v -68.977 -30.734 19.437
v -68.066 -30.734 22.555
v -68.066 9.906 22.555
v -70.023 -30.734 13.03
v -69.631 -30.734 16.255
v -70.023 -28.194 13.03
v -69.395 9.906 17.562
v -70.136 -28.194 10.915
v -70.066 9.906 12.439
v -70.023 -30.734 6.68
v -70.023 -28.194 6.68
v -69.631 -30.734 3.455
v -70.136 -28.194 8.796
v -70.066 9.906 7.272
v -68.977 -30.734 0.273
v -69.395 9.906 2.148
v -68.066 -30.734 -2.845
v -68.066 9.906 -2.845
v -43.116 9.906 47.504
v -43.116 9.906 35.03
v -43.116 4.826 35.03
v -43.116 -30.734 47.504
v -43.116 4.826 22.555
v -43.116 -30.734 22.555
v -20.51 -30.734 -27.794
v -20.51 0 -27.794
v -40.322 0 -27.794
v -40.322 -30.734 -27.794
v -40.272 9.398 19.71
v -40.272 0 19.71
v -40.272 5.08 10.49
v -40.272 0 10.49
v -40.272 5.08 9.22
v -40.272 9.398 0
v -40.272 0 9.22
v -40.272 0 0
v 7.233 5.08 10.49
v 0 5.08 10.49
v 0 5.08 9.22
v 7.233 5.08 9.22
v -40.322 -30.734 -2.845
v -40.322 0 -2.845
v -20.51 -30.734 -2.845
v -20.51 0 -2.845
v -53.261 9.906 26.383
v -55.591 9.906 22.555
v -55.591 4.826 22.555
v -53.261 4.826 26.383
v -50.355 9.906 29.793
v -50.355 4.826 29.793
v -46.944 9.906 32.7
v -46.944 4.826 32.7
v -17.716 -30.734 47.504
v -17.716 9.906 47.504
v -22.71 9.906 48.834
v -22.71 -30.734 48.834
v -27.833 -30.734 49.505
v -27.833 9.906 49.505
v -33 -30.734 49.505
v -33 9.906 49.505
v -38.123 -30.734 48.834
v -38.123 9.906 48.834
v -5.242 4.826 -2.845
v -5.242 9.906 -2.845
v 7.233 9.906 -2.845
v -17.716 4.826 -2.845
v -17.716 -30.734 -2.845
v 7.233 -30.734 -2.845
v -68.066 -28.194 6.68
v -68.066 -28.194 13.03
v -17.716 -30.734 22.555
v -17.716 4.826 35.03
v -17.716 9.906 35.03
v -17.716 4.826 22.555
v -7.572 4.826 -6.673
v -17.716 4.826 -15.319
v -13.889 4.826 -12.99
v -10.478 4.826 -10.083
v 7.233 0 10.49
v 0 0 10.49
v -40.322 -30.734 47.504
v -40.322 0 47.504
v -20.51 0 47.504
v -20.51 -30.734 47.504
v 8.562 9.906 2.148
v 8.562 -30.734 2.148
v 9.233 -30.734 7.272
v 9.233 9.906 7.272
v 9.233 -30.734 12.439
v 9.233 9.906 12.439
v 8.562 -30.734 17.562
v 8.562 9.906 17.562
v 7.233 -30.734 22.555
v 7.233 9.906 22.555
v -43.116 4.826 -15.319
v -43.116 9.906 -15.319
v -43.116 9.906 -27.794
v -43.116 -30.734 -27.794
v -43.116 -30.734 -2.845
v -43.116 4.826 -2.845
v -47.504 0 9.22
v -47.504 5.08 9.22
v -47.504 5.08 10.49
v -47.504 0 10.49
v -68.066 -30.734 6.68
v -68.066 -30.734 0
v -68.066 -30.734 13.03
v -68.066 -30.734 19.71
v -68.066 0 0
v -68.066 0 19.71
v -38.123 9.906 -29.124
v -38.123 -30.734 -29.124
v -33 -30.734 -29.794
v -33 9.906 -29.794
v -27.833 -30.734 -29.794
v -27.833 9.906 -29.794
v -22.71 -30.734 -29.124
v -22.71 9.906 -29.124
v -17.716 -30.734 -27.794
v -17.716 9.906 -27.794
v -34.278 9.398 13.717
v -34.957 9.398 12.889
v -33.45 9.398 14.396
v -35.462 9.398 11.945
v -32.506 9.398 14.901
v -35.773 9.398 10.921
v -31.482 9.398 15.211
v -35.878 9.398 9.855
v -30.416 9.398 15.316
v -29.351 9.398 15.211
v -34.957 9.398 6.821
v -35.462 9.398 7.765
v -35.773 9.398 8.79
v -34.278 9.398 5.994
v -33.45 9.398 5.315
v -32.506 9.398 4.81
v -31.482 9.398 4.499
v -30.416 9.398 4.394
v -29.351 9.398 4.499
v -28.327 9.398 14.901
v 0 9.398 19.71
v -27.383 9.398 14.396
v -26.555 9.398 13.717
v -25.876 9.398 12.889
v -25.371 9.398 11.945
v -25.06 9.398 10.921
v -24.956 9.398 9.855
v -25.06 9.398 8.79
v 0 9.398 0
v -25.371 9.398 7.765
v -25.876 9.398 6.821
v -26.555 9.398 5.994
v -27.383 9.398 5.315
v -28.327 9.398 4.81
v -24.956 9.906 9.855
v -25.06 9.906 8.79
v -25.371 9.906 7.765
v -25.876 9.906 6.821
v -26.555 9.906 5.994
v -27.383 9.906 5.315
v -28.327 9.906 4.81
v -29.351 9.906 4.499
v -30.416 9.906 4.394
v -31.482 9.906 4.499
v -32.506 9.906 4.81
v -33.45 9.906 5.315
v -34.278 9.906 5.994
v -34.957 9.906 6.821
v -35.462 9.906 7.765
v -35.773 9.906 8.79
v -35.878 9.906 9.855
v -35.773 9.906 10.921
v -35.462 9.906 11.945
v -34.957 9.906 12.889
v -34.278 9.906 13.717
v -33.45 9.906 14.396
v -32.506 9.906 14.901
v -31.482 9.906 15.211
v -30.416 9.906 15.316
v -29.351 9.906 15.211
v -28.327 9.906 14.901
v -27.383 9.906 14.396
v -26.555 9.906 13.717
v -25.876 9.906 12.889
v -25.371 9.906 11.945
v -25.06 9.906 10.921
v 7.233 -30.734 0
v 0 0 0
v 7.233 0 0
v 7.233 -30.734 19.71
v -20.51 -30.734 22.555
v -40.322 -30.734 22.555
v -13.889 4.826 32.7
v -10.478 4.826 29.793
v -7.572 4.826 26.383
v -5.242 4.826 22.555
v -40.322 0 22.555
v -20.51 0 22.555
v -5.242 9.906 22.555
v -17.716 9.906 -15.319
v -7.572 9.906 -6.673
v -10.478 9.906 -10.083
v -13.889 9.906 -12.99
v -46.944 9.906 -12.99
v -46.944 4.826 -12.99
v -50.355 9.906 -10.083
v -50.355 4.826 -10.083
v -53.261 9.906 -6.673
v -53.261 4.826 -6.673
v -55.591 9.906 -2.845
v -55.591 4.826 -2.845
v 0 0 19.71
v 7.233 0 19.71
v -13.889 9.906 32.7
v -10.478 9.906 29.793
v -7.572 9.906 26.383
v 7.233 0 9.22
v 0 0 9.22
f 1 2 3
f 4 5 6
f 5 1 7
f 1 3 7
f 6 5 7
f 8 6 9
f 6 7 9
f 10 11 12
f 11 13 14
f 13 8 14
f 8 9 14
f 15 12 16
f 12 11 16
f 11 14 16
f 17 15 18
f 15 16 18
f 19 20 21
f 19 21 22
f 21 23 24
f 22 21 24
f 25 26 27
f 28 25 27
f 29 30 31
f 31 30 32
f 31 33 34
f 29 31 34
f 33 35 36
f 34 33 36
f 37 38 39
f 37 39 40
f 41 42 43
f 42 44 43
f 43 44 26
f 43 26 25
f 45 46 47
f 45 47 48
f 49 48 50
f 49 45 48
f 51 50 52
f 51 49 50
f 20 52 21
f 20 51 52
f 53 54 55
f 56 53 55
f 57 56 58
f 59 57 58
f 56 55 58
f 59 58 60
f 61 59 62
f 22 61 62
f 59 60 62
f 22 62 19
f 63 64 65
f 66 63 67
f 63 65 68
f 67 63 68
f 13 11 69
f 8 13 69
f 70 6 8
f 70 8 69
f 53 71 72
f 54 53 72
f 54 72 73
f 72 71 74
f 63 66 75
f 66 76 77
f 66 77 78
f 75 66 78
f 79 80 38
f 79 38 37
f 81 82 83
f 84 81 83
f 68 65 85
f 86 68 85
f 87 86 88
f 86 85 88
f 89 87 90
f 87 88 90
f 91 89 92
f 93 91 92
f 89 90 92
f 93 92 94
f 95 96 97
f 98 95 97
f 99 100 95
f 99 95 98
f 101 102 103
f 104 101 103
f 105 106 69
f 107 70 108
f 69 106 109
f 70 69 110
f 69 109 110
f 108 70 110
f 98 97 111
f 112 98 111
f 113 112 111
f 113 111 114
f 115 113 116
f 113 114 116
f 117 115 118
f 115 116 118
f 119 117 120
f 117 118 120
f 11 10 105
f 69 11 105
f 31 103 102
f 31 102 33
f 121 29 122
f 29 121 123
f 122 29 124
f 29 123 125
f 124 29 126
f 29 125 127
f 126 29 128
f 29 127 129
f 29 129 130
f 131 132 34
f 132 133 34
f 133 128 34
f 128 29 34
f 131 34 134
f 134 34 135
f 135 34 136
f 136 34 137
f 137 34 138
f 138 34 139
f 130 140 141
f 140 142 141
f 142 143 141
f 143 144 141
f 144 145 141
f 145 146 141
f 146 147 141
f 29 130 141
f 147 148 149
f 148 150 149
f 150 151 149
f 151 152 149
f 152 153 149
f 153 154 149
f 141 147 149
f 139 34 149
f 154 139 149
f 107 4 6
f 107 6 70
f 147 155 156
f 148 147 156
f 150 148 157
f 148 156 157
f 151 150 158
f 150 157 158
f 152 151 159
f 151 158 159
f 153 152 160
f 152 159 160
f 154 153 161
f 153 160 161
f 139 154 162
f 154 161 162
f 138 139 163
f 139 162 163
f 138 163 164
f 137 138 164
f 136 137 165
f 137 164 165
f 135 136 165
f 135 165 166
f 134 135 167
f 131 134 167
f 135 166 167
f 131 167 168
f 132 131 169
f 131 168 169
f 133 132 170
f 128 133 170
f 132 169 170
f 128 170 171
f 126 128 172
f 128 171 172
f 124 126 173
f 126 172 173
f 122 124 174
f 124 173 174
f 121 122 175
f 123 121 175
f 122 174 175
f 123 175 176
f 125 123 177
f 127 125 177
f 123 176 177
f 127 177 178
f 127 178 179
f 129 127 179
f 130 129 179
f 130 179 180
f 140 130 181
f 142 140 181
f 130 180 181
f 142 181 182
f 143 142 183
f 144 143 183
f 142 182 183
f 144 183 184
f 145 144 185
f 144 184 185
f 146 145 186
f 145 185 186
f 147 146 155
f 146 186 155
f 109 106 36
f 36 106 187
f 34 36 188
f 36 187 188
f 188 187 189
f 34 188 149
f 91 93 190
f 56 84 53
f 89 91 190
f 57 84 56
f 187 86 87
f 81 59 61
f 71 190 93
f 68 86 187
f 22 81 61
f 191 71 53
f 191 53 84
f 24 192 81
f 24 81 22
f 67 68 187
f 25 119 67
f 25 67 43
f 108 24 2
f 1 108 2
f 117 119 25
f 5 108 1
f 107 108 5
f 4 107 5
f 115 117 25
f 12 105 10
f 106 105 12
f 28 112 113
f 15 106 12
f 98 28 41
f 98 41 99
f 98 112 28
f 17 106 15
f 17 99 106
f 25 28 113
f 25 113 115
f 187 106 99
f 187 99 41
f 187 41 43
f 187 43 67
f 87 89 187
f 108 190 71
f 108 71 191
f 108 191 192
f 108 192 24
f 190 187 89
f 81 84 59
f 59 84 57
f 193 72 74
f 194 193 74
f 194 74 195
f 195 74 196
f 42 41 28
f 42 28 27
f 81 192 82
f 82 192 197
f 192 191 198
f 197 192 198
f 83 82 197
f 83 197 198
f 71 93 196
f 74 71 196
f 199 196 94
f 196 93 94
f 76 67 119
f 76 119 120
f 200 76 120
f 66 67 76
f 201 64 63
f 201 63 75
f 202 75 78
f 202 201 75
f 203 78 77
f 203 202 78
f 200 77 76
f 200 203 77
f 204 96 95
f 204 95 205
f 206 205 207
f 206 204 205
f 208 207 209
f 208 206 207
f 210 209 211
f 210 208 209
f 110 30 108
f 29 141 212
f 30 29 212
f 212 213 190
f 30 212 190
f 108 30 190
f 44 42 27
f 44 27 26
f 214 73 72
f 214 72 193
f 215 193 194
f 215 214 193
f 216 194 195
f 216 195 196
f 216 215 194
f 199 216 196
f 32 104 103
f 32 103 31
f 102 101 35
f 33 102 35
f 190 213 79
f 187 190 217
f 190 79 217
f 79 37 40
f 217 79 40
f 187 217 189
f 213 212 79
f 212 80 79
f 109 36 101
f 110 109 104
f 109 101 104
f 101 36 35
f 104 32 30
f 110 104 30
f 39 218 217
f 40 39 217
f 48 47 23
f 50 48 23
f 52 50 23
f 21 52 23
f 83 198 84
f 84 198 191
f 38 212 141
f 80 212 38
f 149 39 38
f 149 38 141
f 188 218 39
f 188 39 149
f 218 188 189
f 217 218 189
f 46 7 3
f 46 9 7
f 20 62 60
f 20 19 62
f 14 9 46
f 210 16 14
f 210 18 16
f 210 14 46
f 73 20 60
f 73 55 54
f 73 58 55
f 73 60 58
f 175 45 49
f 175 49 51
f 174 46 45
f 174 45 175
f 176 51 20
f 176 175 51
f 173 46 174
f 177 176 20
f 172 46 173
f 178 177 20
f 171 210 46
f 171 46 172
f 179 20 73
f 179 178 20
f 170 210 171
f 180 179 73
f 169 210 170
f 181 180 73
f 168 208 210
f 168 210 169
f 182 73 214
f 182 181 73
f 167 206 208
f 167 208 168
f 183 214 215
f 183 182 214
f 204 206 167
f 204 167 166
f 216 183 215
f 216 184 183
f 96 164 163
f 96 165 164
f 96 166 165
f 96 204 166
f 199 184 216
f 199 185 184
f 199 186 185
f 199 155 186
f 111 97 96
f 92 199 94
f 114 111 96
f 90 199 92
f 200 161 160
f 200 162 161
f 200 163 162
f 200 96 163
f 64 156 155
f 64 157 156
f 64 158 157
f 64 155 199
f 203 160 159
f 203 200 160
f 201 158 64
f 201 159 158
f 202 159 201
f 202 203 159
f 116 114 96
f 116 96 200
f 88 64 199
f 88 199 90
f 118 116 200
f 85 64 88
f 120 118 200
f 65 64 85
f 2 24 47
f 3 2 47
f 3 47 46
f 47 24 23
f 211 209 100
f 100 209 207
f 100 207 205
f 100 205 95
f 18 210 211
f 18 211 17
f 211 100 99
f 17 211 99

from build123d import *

# Parameters (mm, degrees)
SKETCH1_W           = 54.737
SKETCH1_H           = 25.4
SKETCH1_W_2         = 40.2717
SKETCH1_H_2         = 19.7104
BOSS_EXTRUDE2_DEPTH = 9.906
SKETCH3_R           = 9.8552
SKETCH3_R_2         = 5.461
BOSS_EXTRUDE3_DEPTH = 0.508
SKETCH9_W           = 7.23265
SKETCH9_H           = 1.27
CUT_EXTRUDE2_DEPTH  = 5.08
SKETCH12_W          = 54.737
SKETCH12_H          = 2.8448
BOSS_EXTRUDE4_DEPTH = 30.734
BOSS_EXTRUDE5_DEPTH = 20.5613
BOSS_EXTRUDE6_DEPTH = 24.94915
BOSS_EXTRUDE7_DEPTH = 24.94915
BOSS_EXTRUDE8_DEPTH = 40.64
BOSS_EXTRUDE9_DEPTH = 5.08
SKETCH25_W          = 2.54
SKETCH25_H          = 6.35
CUT_EXTRUDE3_DEPTH  = 2.54


with BuildPart() as part:
    # Sketch1 → Boss-Extrude2 (new body)
    with BuildSketch(Plane(origin=(0, 0, 0), x_dir=(1, 0, 0), z_dir=(0, 1, 0))):
        with Locations((-20.13585, -9.8552)):
            Rectangle(SKETCH1_W, SKETCH1_H)
        with Locations((-20.13585, -9.8552)):
            Rectangle(SKETCH1_W_2, SKETCH1_H_2, mode=Mode.SUBTRACT)
    extrude(amount=BOSS_EXTRUDE2_DEPTH)

    # Sketch3 → Boss-Extrude3 (add)
    with BuildSketch(Plane(origin=(0, 9.906, 0), x_dir=(1, 0, 0), z_dir=(0, 1, 0))):
        with Locations((-30.4165, -9.8552)):
            Circle(SKETCH3_R)
        with Locations((-30.4165, -9.8552)):
            Circle(SKETCH3_R_2, mode=Mode.SUBTRACT)
        with BuildLine():
            ThreePointArc((-30.4165, -19.7104), (-37.38517875, -16.82387875), (-40.2717, -9.8552))
            Line((-40.2717, -9.8552), (-40.2717, -19.7104))
            Line((-40.2717, -19.7104), (-30.4165, -19.7104))
        make_face()
        with BuildLine():
            Line((0, 0), (-30.4165, 0))
            ThreePointArc((-30.4165, 0), (-23.44782125, -2.88652125), (-20.5613, -9.8552))
            ThreePointArc((-20.5613, -9.8552), (-23.44782125, -16.82387875), (-30.4165, -19.7104))
            Line((-30.4165, -19.7104), (0, -19.7104))
            Line((0, -19.7104), (0, 0))
        make_face()
        with BuildLine():
            Line((-30.4165, 0), (-40.2717, 0))
            Line((-40.2717, 0), (-40.2717, -9.8552))
            ThreePointArc((-40.2717, -9.8552), (-37.38517875, -2.88652125), (-30.4165, 0))
        make_face()
    extrude(amount=-BOSS_EXTRUDE3_DEPTH)

    # Sketch9 → Cut-Extrude2 (cut)
    with BuildSketch(Plane.XZ):
        with Locations((-43.888025, 9.8552)):
            Rectangle(SKETCH9_W, SKETCH9_H)
        with Locations((3.616325, 9.8552)):
            Rectangle(SKETCH9_W, SKETCH9_H)
    extrude(amount=-CUT_EXTRUDE2_DEPTH, mode=Mode.SUBTRACT)

    # Sketch12 → Boss-Extrude4 (add)
    with BuildSketch(Plane.XZ):
        with Locations((-20.13585, 21.1328)):
            Rectangle(SKETCH12_W, SKETCH12_H)
        with Locations((-20.13585, -1.4224)):
            Rectangle(SKETCH12_W, SKETCH12_H)
    extrude(amount=BOSS_EXTRUDE4_DEPTH)

    # Sketch19 → Boss-Extrude5 (add)
    with BuildSketch(Plane.ZY.offset(47.50435)):
        Polygon((-2.8448, -30.734), (0, -30.734), (0, 0), (19.7104, 0), (19.7104, -30.734), (22.5552, -30.734), (22.5552, 9.906), (-2.8448, 9.906), align=None)
    extrude(amount=BOSS_EXTRUDE5_DEPTH)

    # Sketch20 → Boss-Extrude6 (add)
    with BuildSketch(Plane(origin=(0, 0, -2.8448), x_dir=(-1, 0, 0), z_dir=(0, 0, -1))):
        Polygon((17.7165, 9.906), (43.1165, 9.906), (43.1165, -30.734), (40.3225, -30.734), (40.3225, 0), (20.5105, 0), (20.5105, -30.734), (17.7165, -30.734), align=None)
    extrude(amount=BOSS_EXTRUDE6_DEPTH)

    # Sketch21 → Boss-Extrude7 (add)
    with BuildSketch(Plane.XY.offset(22.5552)):
        Polygon((-43.1165, 9.906), (-43.1165, -30.734), (-40.3225, -30.734), (-40.3225, 0), (-20.5105, 0), (-20.5105, -30.734), (-17.7165, -30.734), (-17.7165, 9.906), align=None)
    extrude(amount=BOSS_EXTRUDE7_DEPTH)

    # Sketch23 → Boss-Extrude8 (add)
    with BuildSketch(Plane(origin=(0, 9.906, 0), x_dir=(1, 0, 0), z_dir=(0, 1, 0))):
        with BuildLine():
            Line((-68.06565, 2.8448), (-68.06565, -22.5552))
            ThreePointArc((-68.06565, -22.5552), (-70.149968207, -9.8552), (-68.06565, 2.8448))
        make_face()
        with BuildLine():
            Line((-43.1165, -47.50435), (-17.7165, -47.50435))
            ThreePointArc((-17.7165, -47.50435), (-30.4165, -49.588668207), (-43.1165, -47.50435))
        make_face()
        with BuildLine():
            Line((7.23265, -22.5552), (7.23265, 2.8448))
            ThreePointArc((7.23265, 2.8448), (9.316968207, -9.8552), (7.23265, -22.5552))
        make_face()
        with BuildLine():
            Line((-17.7165, 27.79395), (-43.1165, 27.79395))
            ThreePointArc((-43.1165, 27.79395), (-30.4165, 29.878268207), (-17.7165, 27.79395))
        make_face()
    extrude(amount=-BOSS_EXTRUDE8_DEPTH)

    # Sketch24 → Boss-Extrude9 (add)
    with BuildSketch(Plane(origin=(0, 9.906, 0), x_dir=(1, 0, 0), z_dir=(0, 1, 0))):
        with BuildLine():
            ThreePointArc((-43.1165, 15.319375), (-50.35451929, 10.08281929), (-55.591075, 2.8448))
            Line((-55.591075, 2.8448), (-43.1165, 2.8448))
            Line((-43.1165, 2.8448), (-43.1165, 15.319375))
        make_face()
        with BuildLine():
            ThreePointArc((-55.591075, -22.5552), (-50.35451929, -29.79321929), (-43.1165, -35.029775))
            Line((-43.1165, -35.029775), (-43.1165, -22.5552))
            Line((-43.1165, -22.5552), (-55.591075, -22.5552))
        make_face()
        with BuildLine():
            ThreePointArc((-17.7165, -35.029775), (-10.47848071, -29.79321929), (-5.241925, -22.5552))
            Line((-5.241925, -22.5552), (-17.7165, -22.5552))
            Line((-17.7165, -22.5552), (-17.7165, -35.029775))
        make_face()
        with BuildLine():
            ThreePointArc((-5.241925, 2.8448), (-10.47848071, 10.08281929), (-17.7165, 15.319375))
            Line((-17.7165, 15.319375), (-17.7165, 2.8448))
            Line((-17.7165, 2.8448), (-5.241925, 2.8448))
        make_face()
    extrude(amount=-BOSS_EXTRUDE9_DEPTH)

    # Sketch25 → Cut-Extrude3 (cut)
    with BuildSketch(Plane.XZ.offset(30.734)):
        with Locations((-69.33565, 9.8552)):
            Rectangle(SKETCH25_W, SKETCH25_H)
    extrude(amount=-CUT_EXTRUDE3_DEPTH, mode=Mode.SUBTRACT)


solid = part.part
